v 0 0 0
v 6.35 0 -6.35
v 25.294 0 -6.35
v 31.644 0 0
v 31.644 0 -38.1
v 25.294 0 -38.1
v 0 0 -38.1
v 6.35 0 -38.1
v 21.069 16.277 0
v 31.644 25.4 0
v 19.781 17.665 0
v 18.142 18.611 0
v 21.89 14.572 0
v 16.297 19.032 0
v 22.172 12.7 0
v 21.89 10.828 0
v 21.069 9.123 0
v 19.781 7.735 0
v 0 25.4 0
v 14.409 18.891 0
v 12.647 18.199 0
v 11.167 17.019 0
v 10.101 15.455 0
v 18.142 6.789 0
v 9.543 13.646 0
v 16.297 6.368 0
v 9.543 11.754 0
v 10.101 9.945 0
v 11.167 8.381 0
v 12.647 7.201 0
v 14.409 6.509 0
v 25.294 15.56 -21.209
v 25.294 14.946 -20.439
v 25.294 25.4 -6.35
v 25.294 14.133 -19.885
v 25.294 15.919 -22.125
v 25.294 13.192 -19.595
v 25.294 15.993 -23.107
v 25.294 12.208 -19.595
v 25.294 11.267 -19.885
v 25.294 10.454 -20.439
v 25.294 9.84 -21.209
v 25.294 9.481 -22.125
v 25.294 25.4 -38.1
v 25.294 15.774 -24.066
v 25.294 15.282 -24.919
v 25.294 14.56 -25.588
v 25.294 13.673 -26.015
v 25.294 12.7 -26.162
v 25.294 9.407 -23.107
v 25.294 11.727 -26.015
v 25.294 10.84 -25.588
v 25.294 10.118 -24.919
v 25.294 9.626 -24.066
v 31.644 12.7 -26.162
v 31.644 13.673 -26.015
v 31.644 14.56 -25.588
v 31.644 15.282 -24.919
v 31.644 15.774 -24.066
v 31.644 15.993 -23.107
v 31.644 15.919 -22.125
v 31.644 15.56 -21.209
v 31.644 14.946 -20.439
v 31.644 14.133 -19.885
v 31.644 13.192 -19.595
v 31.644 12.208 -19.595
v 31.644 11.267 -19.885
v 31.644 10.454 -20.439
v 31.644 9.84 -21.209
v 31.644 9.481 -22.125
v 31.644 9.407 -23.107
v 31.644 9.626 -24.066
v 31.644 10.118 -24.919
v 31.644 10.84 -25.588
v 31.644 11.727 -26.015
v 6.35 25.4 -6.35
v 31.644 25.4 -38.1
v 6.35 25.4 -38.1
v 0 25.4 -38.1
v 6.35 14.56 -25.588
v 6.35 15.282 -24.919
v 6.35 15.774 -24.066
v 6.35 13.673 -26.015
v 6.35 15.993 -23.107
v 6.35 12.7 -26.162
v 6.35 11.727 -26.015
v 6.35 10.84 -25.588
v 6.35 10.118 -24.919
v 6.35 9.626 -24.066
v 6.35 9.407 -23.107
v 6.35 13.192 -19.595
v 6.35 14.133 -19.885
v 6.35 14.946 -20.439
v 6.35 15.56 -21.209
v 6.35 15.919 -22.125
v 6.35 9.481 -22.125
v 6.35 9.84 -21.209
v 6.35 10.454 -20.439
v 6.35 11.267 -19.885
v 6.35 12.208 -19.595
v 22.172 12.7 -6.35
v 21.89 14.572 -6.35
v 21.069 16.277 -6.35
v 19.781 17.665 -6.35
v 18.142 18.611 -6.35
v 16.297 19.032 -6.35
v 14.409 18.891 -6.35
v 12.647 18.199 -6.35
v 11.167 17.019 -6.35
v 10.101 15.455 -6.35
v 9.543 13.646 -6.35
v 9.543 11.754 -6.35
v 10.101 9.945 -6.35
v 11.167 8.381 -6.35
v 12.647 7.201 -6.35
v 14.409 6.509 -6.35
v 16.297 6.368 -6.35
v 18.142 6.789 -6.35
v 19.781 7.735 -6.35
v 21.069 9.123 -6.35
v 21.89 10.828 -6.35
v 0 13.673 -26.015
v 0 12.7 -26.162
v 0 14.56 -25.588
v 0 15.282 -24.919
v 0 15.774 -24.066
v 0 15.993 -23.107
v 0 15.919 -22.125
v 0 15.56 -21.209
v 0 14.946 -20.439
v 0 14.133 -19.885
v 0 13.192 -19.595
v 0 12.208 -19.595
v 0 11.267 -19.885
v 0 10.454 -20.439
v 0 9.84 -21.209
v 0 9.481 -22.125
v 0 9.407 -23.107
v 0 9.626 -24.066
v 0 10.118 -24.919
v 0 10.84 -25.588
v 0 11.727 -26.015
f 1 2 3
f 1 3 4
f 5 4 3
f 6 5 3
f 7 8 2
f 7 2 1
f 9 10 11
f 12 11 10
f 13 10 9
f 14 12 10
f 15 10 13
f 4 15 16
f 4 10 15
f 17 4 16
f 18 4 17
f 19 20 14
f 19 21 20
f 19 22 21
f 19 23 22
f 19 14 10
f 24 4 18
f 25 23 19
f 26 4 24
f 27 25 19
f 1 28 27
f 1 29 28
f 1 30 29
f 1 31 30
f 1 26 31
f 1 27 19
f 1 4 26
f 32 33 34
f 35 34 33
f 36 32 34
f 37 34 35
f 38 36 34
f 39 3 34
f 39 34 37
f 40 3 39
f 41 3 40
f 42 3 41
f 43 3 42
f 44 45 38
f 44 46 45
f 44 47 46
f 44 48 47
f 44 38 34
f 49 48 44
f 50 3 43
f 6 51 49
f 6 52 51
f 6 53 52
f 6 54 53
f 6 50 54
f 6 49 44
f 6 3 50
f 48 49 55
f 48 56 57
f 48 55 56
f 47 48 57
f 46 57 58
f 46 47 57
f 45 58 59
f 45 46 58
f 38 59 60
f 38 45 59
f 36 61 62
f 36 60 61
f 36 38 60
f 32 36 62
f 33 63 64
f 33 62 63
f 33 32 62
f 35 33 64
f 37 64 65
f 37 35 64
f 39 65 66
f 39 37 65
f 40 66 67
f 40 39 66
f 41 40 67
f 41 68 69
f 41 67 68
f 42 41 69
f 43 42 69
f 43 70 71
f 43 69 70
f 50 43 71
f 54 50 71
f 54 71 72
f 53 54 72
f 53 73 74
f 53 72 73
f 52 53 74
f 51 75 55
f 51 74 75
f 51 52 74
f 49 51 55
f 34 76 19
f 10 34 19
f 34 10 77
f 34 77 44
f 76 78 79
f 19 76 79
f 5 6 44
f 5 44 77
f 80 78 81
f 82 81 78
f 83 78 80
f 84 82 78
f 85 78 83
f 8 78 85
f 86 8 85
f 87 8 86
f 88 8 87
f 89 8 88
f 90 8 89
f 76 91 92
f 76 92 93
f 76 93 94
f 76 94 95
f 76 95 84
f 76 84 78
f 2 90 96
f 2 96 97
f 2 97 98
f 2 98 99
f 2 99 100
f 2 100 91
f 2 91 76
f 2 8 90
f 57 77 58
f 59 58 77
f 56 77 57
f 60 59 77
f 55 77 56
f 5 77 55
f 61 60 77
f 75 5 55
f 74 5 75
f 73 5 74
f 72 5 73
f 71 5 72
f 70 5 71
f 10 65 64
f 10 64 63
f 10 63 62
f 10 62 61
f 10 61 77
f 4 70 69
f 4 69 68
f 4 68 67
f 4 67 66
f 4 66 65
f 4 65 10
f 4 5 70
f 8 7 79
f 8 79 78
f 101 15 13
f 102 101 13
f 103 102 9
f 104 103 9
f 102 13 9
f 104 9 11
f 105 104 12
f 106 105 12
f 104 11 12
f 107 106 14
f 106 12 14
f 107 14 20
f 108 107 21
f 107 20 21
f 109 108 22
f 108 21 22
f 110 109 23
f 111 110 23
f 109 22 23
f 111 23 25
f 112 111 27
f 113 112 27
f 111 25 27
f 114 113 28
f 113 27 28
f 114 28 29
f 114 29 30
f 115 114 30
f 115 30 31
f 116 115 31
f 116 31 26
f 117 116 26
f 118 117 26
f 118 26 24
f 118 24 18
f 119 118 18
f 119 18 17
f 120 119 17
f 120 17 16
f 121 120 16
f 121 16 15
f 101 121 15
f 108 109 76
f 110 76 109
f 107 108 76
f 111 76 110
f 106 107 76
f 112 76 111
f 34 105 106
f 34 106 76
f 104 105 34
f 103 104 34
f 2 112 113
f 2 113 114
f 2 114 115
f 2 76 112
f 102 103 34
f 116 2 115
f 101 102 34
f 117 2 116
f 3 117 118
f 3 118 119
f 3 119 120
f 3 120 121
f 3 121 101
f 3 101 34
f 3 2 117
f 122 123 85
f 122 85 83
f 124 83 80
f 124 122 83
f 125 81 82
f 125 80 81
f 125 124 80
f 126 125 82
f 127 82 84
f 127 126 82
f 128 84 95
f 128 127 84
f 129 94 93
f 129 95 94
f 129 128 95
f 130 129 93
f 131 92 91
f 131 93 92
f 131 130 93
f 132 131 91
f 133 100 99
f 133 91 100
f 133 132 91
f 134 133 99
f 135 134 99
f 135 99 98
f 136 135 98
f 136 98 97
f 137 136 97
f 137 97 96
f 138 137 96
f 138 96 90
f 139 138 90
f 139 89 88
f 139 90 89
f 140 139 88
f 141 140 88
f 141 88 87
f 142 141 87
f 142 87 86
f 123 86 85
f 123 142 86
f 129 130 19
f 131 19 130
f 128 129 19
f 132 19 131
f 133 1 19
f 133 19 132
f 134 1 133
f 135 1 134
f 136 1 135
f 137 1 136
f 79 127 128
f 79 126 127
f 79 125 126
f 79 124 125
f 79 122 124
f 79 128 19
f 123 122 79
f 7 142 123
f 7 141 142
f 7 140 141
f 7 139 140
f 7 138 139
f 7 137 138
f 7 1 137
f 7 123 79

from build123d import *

# Parameters (mm, degrees)
BOSS_EXTRUDE1_DEPTH     = 25.4
SKETCH2_R               = 6.35
CUT_EXTRUDE1_DEPTH      = 56.660932074
CUT_EXTRUDE2_DEPTH      = 53.31230942
CUT_EXTRUDE2_DEPTH_BACK = 53.31230942
SKETCH5_R               = 3.302


with BuildPart() as part:
    # Sketch1 → Boss-Extrude1 (new body)
    with BuildSketch(Plane(origin=(0, 0, 0), x_dir=(1, 0, 0), z_dir=(0, 1, 0))):
        Polygon((0, 0), (0, 38.1), (6.35, 38.1), (6.35, 6.35), (25.294420667, 6.35), (25.294420667, 38.1), (31.644420667, 38.1), (31.644420667, 0), align=None)
    extrude(amount=BOSS_EXTRUDE1_DEPTH)

    # Sketch2 → Cut-Extrude1 (cut, through all)
    with BuildSketch(Plane.XY):
        with Locations((15.822210333, 12.7)):
            Circle(SKETCH2_R)
    extrude(amount=-CUT_EXTRUDE1_DEPTH, mode=Mode.SUBTRACT)

    # Sketch5 → Cut-Extrude2 (cut, two sides: drawn at the far end of the back side and taken through both)
    with BuildSketch(Plane(origin=(6.35, 0, 0), x_dir=(0, 0, -1), z_dir=(1, 0, 0)).offset(-CUT_EXTRUDE2_DEPTH_BACK)):
        with Locations((22.86, 12.7)):
            Circle(SKETCH5_R)
    extrude(amount=CUT_EXTRUDE2_DEPTH + CUT_EXTRUDE2_DEPTH_BACK, mode=Mode.SUBTRACT)


solid = part.part
